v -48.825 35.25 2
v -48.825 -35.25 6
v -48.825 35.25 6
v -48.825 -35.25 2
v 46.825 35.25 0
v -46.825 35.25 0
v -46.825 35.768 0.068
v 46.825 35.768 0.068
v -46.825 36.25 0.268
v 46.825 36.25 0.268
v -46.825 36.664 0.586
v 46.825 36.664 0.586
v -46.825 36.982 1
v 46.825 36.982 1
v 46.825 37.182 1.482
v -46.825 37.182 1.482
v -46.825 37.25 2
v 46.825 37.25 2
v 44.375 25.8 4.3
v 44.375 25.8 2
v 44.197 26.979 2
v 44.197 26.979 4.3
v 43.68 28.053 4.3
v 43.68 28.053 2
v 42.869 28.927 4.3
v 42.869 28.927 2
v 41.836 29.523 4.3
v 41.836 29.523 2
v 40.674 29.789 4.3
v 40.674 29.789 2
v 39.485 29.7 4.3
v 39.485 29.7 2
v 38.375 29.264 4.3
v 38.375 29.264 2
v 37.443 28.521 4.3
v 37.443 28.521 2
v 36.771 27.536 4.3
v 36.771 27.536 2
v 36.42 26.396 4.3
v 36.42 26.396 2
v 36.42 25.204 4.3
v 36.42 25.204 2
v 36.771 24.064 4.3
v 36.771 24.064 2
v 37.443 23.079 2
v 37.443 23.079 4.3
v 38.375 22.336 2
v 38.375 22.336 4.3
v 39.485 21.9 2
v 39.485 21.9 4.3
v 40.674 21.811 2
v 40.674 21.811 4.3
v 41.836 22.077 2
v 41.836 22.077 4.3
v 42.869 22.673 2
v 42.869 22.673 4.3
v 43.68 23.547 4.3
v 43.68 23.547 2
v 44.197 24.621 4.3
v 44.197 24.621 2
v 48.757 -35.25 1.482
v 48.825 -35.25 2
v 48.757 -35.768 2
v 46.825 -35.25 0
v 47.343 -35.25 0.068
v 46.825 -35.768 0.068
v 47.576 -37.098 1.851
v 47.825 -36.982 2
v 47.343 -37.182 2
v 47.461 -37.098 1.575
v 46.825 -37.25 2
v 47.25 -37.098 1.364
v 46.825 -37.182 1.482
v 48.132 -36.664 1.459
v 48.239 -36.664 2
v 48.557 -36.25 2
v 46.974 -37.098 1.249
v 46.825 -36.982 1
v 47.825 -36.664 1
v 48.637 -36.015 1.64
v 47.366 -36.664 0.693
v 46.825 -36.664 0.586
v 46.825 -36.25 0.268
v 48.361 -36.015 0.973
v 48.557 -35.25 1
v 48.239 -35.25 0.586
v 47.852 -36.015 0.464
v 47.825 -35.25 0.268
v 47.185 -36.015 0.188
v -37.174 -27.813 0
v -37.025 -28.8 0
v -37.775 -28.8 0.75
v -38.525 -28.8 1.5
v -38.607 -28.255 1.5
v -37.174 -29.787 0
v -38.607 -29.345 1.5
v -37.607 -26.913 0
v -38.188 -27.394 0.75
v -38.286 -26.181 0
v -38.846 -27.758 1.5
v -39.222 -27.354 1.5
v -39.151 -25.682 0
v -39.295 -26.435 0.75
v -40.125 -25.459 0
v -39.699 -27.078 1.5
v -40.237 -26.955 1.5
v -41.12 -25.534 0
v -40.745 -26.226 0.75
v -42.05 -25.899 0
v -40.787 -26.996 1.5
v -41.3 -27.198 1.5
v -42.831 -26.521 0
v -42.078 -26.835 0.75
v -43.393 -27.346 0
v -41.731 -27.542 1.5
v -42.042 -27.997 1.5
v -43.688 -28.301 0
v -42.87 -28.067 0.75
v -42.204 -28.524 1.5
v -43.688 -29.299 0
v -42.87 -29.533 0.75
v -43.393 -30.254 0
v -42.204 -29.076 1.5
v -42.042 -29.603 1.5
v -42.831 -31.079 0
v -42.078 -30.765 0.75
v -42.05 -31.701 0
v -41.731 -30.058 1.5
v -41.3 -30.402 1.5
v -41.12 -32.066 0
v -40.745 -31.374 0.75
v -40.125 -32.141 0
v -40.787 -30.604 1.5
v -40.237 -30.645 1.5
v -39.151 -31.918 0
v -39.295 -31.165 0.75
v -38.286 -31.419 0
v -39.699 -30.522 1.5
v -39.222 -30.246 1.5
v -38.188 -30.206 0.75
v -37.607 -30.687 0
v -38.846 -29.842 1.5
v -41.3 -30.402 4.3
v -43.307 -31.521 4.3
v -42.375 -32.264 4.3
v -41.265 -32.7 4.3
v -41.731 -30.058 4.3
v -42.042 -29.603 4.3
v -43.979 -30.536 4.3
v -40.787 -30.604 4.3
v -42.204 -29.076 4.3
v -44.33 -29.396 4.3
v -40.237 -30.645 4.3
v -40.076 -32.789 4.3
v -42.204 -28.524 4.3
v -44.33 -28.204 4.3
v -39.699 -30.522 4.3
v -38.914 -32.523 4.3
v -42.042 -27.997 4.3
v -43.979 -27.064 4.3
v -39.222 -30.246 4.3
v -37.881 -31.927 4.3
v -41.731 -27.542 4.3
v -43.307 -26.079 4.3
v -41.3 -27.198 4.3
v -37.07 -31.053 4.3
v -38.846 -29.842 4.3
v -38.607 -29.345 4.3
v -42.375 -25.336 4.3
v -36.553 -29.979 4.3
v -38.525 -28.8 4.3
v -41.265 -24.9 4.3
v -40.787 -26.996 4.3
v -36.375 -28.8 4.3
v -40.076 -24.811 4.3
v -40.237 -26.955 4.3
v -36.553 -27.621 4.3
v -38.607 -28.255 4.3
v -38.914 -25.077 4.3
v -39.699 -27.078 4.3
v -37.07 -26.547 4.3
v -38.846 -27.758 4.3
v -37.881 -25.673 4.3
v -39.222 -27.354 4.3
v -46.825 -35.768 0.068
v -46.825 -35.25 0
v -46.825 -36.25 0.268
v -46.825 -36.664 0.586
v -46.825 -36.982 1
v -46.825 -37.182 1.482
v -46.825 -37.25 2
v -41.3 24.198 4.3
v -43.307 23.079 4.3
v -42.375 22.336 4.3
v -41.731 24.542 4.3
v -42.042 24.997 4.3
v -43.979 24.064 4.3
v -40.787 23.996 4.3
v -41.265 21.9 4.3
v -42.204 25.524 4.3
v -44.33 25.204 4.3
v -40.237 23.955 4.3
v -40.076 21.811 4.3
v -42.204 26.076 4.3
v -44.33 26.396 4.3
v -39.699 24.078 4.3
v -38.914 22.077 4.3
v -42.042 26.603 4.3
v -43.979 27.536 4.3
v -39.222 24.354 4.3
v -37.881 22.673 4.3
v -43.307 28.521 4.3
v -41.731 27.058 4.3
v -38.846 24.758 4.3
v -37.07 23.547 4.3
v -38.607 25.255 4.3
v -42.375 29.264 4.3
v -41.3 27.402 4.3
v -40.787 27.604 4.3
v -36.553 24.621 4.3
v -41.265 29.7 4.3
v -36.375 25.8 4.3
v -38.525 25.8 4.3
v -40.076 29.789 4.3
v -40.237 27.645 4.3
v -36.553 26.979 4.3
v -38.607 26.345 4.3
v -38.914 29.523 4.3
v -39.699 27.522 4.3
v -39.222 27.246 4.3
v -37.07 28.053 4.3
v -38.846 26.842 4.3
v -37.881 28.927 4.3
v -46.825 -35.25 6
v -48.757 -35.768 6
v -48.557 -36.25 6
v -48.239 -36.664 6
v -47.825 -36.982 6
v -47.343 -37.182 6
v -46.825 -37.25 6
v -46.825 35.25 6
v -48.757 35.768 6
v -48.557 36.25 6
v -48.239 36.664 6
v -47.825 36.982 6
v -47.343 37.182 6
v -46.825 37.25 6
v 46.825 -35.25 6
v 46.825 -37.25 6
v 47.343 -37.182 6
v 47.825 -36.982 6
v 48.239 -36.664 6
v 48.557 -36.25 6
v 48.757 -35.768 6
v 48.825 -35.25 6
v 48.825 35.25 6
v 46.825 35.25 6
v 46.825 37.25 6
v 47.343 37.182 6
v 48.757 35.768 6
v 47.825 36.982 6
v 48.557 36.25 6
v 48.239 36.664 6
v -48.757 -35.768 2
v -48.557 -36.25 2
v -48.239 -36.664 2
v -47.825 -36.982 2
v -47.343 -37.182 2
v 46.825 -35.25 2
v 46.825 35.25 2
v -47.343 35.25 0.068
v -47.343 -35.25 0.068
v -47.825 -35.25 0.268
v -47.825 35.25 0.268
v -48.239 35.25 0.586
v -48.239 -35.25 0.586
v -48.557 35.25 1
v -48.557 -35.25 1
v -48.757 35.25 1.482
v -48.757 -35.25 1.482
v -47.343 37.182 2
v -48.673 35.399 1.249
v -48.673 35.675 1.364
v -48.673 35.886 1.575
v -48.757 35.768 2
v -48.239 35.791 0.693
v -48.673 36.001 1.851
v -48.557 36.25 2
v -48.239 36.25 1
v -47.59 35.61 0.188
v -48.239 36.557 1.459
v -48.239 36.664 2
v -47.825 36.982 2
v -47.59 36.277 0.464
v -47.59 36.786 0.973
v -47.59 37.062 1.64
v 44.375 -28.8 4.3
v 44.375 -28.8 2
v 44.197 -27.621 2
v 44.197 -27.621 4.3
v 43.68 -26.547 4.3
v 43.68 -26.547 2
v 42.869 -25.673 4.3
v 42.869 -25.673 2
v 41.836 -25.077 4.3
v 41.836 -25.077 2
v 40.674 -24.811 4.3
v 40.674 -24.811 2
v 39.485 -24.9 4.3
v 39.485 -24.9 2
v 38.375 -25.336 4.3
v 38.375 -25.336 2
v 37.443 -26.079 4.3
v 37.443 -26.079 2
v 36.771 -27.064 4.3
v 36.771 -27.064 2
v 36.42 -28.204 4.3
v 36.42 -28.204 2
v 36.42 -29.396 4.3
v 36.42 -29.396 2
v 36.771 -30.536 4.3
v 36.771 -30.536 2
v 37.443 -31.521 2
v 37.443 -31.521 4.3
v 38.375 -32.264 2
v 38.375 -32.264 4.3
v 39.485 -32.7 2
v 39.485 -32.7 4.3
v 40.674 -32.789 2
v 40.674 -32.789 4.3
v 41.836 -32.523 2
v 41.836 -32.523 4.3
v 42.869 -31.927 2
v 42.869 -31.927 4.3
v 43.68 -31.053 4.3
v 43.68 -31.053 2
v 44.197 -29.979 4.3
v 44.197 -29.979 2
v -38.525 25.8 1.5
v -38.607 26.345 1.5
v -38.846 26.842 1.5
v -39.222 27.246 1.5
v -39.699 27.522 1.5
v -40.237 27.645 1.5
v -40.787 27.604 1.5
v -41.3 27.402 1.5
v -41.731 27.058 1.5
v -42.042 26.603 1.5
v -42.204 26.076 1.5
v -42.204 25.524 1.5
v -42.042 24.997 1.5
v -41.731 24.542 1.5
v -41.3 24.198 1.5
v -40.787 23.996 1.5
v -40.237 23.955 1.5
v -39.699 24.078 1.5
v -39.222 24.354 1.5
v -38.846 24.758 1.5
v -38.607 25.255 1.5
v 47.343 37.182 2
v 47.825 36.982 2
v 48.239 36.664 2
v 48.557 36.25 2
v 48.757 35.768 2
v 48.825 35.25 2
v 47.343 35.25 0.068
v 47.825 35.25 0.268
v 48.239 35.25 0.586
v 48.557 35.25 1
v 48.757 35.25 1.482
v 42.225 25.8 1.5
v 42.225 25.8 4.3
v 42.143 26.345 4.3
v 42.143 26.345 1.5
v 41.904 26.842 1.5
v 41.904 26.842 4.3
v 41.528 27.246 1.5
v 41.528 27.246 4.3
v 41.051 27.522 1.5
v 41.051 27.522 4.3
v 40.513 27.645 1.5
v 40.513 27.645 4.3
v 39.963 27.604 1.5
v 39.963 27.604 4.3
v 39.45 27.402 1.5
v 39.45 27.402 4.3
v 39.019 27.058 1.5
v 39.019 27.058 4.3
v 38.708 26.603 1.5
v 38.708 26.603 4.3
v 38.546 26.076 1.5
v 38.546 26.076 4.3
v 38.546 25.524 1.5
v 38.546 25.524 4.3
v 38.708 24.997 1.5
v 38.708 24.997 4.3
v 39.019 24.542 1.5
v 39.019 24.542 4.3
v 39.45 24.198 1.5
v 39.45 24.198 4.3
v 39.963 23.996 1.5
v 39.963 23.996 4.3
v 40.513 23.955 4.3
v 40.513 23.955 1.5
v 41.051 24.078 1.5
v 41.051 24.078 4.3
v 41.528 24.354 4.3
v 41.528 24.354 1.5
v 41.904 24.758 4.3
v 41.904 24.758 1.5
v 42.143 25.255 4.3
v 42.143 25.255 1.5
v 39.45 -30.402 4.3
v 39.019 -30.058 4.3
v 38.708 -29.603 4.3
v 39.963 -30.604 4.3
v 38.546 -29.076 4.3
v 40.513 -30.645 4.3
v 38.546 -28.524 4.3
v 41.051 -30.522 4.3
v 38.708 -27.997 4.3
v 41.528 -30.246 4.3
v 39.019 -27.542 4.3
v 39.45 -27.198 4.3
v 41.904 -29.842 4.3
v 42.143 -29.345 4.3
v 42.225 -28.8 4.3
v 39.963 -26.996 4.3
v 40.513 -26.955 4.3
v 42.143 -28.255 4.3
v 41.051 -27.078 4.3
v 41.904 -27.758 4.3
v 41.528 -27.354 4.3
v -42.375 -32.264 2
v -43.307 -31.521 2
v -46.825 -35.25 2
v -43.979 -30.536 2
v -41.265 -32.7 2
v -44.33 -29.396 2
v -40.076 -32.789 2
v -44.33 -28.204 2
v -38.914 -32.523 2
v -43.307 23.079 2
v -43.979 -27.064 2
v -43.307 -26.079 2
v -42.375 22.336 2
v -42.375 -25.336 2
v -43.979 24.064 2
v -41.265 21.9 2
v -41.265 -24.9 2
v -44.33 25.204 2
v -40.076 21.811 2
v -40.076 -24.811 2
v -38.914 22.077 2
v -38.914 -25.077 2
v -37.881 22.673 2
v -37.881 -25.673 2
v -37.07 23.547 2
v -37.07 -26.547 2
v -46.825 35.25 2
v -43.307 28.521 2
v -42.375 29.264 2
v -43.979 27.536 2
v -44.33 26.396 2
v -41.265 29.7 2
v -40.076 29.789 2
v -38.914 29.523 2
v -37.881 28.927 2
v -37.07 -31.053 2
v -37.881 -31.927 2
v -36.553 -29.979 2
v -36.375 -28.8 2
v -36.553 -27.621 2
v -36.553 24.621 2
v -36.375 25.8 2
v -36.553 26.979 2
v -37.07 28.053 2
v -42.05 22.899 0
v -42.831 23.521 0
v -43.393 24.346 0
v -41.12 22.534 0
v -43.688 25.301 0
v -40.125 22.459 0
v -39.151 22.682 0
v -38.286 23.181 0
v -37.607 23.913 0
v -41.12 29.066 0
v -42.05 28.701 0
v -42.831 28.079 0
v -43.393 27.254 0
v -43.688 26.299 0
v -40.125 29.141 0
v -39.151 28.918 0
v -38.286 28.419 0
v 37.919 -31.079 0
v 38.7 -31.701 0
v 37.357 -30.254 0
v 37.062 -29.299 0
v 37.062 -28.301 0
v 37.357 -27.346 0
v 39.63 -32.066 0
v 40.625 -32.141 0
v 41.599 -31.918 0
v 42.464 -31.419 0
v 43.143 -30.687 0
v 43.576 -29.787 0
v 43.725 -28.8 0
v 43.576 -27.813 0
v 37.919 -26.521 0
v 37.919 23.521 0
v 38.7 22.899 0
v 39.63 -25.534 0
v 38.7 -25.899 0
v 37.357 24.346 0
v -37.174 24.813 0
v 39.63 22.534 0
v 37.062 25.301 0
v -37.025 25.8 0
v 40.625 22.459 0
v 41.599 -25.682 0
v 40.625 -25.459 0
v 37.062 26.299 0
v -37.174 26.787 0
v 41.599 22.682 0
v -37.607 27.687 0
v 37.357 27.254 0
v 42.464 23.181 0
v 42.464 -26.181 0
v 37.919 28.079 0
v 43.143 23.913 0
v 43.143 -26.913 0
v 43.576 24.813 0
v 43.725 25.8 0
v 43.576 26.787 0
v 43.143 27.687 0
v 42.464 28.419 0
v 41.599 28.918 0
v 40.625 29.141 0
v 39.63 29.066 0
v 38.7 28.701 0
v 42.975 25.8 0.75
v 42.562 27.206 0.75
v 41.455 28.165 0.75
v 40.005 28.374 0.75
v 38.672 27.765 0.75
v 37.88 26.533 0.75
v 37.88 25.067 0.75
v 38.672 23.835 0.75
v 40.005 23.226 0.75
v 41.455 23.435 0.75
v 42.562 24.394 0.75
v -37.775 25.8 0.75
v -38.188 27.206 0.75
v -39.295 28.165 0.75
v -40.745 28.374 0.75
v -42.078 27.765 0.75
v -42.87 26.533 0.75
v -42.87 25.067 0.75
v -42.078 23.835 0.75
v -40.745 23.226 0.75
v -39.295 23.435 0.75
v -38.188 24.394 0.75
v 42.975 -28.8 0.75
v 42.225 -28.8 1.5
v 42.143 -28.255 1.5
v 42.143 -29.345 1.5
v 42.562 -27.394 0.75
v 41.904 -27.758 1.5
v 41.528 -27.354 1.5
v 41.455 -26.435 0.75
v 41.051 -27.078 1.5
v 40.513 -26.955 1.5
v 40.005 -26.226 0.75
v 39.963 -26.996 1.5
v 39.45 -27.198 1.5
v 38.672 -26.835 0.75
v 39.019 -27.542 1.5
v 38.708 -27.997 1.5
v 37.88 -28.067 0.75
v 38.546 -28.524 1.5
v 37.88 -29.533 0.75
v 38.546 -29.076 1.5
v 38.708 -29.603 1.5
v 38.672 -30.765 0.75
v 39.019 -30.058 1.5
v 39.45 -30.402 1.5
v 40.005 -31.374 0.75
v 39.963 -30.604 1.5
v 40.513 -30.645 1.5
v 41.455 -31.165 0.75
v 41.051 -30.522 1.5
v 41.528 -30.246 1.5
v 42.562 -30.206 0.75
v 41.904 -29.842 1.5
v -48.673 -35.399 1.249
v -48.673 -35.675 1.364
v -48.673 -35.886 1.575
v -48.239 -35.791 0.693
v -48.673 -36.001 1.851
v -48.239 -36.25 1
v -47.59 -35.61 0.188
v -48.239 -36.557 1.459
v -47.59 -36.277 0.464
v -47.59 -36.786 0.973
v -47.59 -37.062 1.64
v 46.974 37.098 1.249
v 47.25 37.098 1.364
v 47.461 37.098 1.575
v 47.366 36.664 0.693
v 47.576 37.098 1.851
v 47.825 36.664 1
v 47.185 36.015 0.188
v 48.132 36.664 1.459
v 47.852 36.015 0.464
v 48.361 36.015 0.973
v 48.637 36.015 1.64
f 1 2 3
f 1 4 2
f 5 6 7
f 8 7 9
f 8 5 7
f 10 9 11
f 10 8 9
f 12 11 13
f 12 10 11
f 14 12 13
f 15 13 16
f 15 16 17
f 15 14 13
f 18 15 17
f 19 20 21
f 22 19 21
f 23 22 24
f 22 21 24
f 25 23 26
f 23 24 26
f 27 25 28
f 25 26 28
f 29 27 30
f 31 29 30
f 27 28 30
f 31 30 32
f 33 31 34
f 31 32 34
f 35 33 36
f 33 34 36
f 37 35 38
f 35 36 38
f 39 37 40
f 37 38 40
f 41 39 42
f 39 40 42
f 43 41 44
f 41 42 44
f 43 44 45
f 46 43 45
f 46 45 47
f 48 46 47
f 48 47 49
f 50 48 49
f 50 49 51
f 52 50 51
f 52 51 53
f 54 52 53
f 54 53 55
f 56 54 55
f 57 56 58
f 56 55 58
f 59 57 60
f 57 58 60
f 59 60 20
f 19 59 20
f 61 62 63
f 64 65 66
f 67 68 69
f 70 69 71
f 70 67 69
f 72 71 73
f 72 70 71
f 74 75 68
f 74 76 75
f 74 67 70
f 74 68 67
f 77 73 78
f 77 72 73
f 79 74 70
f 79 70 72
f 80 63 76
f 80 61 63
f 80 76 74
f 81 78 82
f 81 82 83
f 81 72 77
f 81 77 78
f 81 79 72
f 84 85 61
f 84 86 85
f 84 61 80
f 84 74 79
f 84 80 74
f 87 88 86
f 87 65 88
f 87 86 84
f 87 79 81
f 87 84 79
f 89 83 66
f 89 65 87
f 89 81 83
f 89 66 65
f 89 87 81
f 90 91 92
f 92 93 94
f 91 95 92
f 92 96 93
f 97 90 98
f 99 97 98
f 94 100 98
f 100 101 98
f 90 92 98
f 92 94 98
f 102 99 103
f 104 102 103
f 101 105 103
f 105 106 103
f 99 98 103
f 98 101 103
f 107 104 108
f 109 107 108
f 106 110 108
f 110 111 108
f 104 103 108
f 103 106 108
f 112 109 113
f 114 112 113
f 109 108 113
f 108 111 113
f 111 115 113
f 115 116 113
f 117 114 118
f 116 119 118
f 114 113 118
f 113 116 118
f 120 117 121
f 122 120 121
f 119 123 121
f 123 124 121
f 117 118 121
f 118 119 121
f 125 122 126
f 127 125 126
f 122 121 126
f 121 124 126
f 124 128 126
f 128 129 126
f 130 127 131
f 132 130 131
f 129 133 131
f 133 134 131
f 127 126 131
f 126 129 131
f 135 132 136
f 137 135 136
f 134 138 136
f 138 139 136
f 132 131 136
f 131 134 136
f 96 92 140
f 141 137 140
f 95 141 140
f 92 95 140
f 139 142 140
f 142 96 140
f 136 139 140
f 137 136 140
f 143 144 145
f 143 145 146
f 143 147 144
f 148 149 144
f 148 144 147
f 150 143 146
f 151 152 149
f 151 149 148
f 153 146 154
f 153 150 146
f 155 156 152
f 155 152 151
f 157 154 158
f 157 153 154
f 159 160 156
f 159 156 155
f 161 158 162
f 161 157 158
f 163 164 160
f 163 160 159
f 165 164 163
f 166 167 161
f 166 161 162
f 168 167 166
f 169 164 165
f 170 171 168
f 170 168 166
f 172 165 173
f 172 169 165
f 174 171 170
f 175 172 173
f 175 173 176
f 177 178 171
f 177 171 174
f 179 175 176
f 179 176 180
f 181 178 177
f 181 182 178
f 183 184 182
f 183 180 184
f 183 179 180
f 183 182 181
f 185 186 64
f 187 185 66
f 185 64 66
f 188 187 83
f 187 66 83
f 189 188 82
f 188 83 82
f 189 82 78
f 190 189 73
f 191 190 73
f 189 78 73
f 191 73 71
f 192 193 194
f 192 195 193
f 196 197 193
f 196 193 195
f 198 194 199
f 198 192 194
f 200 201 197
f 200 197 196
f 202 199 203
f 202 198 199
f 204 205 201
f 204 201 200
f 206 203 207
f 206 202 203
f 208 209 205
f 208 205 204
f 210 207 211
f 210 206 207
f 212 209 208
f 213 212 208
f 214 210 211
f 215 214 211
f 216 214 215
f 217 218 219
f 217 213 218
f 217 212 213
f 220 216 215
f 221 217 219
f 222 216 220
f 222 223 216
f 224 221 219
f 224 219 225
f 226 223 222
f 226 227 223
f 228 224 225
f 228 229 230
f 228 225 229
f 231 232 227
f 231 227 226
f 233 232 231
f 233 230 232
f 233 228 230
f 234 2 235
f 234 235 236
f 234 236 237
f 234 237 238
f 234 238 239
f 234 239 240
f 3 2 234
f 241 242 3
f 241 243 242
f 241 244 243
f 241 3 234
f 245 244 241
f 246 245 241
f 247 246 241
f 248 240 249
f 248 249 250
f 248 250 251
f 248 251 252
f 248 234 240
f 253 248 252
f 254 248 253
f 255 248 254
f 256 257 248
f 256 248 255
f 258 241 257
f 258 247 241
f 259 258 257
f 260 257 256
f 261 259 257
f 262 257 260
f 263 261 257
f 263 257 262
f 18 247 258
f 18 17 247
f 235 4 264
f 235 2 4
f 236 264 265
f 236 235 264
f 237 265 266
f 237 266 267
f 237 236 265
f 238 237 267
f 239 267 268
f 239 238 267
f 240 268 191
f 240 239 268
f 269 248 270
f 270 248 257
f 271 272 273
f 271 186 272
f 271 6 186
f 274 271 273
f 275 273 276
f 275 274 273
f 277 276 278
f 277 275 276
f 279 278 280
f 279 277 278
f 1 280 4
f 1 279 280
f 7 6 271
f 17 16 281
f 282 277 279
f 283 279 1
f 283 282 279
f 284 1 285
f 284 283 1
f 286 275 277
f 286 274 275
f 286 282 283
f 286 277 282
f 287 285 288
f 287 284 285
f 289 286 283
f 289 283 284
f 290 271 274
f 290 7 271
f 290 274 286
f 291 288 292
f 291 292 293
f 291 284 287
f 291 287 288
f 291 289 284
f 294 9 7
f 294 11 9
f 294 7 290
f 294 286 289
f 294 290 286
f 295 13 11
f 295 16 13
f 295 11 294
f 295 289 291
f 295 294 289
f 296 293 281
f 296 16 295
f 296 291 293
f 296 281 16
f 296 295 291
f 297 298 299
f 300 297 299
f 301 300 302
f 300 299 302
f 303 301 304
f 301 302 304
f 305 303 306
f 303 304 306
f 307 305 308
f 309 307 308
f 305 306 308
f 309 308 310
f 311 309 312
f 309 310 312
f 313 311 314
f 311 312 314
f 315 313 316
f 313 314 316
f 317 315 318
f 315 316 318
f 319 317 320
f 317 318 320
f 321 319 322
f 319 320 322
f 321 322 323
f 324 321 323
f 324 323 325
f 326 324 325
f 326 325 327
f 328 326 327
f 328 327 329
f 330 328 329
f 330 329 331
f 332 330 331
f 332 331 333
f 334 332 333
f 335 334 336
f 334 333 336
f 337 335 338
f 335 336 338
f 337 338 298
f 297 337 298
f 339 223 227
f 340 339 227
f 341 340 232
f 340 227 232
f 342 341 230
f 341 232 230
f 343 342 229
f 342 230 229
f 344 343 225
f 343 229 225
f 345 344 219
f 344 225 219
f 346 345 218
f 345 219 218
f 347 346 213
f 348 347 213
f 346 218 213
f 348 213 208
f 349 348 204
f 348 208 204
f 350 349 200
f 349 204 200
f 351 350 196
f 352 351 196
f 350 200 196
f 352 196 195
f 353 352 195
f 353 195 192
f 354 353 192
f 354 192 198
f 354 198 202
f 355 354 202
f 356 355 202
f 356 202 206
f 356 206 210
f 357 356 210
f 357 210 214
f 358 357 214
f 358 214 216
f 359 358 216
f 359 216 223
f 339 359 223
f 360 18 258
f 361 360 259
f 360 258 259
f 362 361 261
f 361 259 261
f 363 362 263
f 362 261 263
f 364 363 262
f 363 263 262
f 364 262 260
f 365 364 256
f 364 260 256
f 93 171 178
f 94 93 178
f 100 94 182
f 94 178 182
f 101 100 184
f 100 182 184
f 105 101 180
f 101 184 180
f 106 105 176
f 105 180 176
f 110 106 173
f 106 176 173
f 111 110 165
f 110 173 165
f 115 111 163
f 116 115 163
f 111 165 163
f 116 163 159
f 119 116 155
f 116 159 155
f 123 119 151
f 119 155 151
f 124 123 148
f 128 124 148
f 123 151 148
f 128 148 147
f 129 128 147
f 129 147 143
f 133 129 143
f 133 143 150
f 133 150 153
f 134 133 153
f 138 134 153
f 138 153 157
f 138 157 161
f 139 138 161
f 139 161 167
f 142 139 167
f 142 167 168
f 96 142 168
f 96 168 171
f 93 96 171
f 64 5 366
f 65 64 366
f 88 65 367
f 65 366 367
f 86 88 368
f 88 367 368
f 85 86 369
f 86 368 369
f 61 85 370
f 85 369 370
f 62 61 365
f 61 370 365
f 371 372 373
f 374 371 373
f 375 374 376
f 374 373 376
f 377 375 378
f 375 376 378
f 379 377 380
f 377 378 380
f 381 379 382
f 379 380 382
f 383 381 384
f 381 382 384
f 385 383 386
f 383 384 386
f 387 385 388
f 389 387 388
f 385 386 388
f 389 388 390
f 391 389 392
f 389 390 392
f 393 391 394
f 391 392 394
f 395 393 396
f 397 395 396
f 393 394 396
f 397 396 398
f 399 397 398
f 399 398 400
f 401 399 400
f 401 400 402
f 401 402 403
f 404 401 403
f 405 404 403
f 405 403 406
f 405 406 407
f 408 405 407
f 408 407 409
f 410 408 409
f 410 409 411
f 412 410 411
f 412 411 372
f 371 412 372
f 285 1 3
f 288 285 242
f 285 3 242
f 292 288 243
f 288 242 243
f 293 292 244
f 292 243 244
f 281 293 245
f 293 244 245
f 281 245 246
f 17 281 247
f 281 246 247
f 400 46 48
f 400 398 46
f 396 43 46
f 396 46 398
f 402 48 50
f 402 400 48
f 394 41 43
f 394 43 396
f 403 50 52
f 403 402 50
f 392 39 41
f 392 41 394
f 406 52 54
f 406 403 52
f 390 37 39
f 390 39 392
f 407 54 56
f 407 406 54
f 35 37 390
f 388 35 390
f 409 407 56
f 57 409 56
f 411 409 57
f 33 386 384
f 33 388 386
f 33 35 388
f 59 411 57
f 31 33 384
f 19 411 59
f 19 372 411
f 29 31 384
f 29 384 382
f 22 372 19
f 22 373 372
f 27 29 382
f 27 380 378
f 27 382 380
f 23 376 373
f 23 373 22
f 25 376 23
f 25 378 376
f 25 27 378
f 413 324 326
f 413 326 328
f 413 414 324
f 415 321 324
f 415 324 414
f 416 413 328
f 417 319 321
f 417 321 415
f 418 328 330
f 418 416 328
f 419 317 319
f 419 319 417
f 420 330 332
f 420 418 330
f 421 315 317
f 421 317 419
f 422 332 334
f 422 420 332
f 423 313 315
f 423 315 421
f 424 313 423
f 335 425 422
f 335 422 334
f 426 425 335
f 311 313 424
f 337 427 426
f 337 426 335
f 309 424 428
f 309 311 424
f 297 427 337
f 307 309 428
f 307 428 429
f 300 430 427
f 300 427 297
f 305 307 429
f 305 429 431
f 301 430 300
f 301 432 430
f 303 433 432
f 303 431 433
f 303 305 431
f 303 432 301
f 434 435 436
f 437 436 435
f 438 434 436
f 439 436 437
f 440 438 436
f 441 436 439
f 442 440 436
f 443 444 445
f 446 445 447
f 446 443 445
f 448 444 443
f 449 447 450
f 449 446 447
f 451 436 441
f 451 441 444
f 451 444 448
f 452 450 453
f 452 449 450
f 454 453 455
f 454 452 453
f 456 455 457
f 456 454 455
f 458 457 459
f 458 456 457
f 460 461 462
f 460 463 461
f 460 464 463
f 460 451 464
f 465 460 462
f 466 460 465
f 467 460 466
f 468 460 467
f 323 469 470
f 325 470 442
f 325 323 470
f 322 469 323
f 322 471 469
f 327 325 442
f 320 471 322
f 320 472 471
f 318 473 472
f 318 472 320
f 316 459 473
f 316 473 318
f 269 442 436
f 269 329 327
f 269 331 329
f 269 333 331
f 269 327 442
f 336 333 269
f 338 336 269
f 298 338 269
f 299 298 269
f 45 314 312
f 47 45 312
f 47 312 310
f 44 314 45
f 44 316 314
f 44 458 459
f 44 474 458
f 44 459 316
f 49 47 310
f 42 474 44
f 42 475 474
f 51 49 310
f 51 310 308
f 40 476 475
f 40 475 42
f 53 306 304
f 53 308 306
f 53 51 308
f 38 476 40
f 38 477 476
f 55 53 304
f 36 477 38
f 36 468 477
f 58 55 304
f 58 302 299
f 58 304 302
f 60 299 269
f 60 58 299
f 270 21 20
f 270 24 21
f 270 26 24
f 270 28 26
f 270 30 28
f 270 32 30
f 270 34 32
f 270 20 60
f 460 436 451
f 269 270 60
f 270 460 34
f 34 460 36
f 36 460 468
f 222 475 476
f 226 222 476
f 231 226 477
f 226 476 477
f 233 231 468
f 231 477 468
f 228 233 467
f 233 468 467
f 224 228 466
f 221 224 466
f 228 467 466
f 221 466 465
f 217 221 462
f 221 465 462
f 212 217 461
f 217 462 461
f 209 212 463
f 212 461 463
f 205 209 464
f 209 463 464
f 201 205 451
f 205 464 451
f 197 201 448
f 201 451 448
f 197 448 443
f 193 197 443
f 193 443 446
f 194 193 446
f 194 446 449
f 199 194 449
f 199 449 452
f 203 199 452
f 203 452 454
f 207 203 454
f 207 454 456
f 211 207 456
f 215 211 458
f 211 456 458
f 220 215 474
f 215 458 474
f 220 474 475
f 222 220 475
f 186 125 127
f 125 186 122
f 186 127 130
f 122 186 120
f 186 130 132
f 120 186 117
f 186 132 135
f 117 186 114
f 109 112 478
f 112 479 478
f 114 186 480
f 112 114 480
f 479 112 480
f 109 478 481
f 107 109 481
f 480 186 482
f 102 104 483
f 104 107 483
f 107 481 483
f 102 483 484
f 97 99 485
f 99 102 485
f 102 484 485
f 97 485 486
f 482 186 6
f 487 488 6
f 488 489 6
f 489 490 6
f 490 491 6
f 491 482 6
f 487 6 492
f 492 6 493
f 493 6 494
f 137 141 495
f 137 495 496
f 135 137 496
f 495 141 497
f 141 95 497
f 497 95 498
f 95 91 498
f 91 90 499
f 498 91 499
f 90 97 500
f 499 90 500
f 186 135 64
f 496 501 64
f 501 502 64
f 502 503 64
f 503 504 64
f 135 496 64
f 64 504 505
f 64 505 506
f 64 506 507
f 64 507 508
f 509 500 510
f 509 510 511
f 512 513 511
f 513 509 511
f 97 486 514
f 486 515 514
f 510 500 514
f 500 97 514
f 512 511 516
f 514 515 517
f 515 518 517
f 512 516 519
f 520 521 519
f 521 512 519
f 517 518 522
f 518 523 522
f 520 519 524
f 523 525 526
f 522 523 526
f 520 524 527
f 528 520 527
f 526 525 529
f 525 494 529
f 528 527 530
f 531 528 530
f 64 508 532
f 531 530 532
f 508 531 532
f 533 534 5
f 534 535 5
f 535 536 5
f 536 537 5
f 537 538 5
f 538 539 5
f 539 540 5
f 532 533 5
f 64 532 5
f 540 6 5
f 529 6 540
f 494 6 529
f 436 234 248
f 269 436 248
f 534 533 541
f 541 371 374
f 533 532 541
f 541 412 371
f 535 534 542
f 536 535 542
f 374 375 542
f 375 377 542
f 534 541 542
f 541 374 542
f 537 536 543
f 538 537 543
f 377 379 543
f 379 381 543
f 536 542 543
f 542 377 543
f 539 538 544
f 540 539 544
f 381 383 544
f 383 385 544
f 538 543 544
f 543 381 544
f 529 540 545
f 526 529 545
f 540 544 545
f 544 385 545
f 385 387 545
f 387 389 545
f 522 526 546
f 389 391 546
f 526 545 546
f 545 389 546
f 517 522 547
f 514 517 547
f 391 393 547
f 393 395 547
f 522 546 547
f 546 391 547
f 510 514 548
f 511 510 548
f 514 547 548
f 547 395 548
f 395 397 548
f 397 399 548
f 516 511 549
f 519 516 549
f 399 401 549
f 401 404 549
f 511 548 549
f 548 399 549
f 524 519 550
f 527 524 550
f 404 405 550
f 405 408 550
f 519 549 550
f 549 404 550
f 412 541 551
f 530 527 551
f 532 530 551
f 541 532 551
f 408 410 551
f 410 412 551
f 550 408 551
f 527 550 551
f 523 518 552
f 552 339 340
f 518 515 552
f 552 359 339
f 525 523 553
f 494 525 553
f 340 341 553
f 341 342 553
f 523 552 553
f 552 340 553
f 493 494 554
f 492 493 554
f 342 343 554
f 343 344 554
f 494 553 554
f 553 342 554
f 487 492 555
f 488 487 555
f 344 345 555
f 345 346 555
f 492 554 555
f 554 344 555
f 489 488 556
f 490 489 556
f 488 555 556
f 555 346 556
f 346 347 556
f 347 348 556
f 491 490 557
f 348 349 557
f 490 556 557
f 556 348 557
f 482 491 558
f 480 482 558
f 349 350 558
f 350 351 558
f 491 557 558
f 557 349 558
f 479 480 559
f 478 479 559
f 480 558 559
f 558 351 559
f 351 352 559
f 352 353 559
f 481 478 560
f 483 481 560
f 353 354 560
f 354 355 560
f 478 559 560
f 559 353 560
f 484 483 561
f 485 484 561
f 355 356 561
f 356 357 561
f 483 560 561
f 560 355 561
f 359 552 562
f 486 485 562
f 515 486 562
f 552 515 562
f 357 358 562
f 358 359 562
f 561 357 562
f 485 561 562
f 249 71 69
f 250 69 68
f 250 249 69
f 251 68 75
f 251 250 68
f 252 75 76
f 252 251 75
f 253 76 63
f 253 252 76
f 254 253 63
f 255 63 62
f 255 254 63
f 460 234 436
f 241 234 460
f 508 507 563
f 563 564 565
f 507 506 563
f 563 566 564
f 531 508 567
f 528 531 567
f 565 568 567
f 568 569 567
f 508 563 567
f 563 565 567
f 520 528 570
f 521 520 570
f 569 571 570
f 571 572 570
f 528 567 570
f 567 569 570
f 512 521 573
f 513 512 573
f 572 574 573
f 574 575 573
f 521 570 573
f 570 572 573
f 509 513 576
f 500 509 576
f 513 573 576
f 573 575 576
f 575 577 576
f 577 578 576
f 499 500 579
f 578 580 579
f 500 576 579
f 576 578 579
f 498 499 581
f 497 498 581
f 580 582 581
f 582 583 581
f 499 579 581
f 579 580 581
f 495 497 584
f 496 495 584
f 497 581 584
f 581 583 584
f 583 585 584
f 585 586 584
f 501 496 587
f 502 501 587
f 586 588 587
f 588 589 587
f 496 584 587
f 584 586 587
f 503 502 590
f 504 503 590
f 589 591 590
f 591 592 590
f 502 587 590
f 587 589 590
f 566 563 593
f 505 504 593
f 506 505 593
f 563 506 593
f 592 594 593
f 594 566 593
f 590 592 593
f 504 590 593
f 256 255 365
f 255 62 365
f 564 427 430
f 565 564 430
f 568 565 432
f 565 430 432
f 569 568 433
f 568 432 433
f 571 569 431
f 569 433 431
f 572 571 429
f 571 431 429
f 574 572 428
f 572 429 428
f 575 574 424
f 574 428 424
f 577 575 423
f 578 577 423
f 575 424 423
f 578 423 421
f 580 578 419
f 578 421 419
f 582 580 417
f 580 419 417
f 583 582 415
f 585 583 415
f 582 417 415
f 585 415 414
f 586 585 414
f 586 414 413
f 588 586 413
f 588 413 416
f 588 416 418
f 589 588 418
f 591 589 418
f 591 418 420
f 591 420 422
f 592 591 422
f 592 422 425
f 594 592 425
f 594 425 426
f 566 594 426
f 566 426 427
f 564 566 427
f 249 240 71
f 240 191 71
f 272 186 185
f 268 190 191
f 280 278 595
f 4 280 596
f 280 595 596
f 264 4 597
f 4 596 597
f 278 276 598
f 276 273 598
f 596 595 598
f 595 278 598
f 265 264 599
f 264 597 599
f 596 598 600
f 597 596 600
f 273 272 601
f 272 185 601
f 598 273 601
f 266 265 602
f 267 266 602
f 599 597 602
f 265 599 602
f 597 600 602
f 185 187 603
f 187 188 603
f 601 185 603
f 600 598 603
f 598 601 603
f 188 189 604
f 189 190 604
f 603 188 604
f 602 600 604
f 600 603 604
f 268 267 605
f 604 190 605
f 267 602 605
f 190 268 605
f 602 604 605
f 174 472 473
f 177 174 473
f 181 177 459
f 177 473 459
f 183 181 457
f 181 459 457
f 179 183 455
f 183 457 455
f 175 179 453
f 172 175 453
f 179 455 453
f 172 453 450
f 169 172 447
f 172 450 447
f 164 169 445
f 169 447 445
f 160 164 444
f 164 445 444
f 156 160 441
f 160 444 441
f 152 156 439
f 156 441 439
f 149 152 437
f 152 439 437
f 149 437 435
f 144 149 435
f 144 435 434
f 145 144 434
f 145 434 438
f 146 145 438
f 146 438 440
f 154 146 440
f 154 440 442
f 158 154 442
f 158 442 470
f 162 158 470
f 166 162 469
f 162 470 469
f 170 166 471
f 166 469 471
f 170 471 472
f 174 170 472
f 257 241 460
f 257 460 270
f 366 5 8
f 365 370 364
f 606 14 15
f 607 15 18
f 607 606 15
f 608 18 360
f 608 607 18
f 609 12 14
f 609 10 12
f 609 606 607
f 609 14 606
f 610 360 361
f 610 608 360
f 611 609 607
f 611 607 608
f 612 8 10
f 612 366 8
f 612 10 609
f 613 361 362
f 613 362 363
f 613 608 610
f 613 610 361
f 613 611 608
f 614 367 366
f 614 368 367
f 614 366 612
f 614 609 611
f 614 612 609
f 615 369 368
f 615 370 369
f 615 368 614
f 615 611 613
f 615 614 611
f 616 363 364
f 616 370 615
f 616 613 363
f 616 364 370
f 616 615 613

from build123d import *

# Parameters (mm, degrees)
SKETCH_W        = 97.65
SKETCH_H        = 74.5
PAD_DEPTH       = 6
SKETCH001_W     = 93.65
SKETCH001_H     = 70.5
POCKET_DEPTH    = 4
SKETCH002_R     = 4
PAD001_DEPTH    = 2.3
SKETCH003_R     = 1.85
POCKET001_DEPTH = 4.301
CHAMFER_SIZE    = 1.5
FILLET_R        = 2


with BuildPart() as part:
    # Sketch → Pad (new body)
    with BuildSketch(Plane.XY):
        Rectangle(SKETCH_W, SKETCH_H)
    extrude(amount=PAD_DEPTH)

    # Sketch001 → Pocket (cut)
    with BuildSketch(Plane.XY.offset(6)):
        Rectangle(SKETCH001_W, SKETCH001_H)
    extrude(amount=-POCKET_DEPTH, mode=Mode.SUBTRACT)

    # Sketch002 → Pad001 (new body)
    with BuildSketch(Plane.XY.offset(2)):
        with Locations((-40.375, 25.8)):
            Circle(SKETCH002_R)
        with Locations((40.375, 25.8)):
            Circle(SKETCH002_R)
        with Locations((40.375, -28.8)):
            Circle(SKETCH002_R)
        with Locations((-40.375, -28.8)):
            Circle(SKETCH002_R)
    extrude(amount=PAD001_DEPTH)

    # Sketch003 → Pocket001 (cut, through all)
    with BuildSketch(Plane.XY.offset(4.3)):
        with Locations((-40.375, 25.8)):
            Circle(SKETCH003_R)
        with Locations((40.375, -28.8)):
            Circle(SKETCH003_R)
        with Locations((40.375, 25.8)):
            Circle(SKETCH003_R)
        with Locations((-40.375, -28.8)):
            Circle(SKETCH003_R)
    extrude(amount=-POCKET001_DEPTH, mode=Mode.SUBTRACT)

    # Chamfer
    chamfer_edges = [part.edges().sort_by_distance(p)[0] for p in [
        (38.525, 25.8, 0),
        (-42.225, -28.8, 0),
        (38.525, -28.8, 0),
        (-42.225, 25.8, 0),
    ]]
    chamfer(chamfer_edges, length=CHAMFER_SIZE)

    # Fillet
    fillet_edges = [part.edges().sort_by_distance(p)[0] for p in [
        (48.825, 0, 0),
        (48.825, -37.25, 3),
        (0, -37.25, 0),
        (0, 37.25, 0),
        (-48.825, 0, 0),
        (-48.825, 37.25, 3),
        (-48.825, -37.25, 3),
        (48.825, 37.25, 3),
    ]]
    fillet(fillet_edges, radius=FILLET_R)


solid = part.part
